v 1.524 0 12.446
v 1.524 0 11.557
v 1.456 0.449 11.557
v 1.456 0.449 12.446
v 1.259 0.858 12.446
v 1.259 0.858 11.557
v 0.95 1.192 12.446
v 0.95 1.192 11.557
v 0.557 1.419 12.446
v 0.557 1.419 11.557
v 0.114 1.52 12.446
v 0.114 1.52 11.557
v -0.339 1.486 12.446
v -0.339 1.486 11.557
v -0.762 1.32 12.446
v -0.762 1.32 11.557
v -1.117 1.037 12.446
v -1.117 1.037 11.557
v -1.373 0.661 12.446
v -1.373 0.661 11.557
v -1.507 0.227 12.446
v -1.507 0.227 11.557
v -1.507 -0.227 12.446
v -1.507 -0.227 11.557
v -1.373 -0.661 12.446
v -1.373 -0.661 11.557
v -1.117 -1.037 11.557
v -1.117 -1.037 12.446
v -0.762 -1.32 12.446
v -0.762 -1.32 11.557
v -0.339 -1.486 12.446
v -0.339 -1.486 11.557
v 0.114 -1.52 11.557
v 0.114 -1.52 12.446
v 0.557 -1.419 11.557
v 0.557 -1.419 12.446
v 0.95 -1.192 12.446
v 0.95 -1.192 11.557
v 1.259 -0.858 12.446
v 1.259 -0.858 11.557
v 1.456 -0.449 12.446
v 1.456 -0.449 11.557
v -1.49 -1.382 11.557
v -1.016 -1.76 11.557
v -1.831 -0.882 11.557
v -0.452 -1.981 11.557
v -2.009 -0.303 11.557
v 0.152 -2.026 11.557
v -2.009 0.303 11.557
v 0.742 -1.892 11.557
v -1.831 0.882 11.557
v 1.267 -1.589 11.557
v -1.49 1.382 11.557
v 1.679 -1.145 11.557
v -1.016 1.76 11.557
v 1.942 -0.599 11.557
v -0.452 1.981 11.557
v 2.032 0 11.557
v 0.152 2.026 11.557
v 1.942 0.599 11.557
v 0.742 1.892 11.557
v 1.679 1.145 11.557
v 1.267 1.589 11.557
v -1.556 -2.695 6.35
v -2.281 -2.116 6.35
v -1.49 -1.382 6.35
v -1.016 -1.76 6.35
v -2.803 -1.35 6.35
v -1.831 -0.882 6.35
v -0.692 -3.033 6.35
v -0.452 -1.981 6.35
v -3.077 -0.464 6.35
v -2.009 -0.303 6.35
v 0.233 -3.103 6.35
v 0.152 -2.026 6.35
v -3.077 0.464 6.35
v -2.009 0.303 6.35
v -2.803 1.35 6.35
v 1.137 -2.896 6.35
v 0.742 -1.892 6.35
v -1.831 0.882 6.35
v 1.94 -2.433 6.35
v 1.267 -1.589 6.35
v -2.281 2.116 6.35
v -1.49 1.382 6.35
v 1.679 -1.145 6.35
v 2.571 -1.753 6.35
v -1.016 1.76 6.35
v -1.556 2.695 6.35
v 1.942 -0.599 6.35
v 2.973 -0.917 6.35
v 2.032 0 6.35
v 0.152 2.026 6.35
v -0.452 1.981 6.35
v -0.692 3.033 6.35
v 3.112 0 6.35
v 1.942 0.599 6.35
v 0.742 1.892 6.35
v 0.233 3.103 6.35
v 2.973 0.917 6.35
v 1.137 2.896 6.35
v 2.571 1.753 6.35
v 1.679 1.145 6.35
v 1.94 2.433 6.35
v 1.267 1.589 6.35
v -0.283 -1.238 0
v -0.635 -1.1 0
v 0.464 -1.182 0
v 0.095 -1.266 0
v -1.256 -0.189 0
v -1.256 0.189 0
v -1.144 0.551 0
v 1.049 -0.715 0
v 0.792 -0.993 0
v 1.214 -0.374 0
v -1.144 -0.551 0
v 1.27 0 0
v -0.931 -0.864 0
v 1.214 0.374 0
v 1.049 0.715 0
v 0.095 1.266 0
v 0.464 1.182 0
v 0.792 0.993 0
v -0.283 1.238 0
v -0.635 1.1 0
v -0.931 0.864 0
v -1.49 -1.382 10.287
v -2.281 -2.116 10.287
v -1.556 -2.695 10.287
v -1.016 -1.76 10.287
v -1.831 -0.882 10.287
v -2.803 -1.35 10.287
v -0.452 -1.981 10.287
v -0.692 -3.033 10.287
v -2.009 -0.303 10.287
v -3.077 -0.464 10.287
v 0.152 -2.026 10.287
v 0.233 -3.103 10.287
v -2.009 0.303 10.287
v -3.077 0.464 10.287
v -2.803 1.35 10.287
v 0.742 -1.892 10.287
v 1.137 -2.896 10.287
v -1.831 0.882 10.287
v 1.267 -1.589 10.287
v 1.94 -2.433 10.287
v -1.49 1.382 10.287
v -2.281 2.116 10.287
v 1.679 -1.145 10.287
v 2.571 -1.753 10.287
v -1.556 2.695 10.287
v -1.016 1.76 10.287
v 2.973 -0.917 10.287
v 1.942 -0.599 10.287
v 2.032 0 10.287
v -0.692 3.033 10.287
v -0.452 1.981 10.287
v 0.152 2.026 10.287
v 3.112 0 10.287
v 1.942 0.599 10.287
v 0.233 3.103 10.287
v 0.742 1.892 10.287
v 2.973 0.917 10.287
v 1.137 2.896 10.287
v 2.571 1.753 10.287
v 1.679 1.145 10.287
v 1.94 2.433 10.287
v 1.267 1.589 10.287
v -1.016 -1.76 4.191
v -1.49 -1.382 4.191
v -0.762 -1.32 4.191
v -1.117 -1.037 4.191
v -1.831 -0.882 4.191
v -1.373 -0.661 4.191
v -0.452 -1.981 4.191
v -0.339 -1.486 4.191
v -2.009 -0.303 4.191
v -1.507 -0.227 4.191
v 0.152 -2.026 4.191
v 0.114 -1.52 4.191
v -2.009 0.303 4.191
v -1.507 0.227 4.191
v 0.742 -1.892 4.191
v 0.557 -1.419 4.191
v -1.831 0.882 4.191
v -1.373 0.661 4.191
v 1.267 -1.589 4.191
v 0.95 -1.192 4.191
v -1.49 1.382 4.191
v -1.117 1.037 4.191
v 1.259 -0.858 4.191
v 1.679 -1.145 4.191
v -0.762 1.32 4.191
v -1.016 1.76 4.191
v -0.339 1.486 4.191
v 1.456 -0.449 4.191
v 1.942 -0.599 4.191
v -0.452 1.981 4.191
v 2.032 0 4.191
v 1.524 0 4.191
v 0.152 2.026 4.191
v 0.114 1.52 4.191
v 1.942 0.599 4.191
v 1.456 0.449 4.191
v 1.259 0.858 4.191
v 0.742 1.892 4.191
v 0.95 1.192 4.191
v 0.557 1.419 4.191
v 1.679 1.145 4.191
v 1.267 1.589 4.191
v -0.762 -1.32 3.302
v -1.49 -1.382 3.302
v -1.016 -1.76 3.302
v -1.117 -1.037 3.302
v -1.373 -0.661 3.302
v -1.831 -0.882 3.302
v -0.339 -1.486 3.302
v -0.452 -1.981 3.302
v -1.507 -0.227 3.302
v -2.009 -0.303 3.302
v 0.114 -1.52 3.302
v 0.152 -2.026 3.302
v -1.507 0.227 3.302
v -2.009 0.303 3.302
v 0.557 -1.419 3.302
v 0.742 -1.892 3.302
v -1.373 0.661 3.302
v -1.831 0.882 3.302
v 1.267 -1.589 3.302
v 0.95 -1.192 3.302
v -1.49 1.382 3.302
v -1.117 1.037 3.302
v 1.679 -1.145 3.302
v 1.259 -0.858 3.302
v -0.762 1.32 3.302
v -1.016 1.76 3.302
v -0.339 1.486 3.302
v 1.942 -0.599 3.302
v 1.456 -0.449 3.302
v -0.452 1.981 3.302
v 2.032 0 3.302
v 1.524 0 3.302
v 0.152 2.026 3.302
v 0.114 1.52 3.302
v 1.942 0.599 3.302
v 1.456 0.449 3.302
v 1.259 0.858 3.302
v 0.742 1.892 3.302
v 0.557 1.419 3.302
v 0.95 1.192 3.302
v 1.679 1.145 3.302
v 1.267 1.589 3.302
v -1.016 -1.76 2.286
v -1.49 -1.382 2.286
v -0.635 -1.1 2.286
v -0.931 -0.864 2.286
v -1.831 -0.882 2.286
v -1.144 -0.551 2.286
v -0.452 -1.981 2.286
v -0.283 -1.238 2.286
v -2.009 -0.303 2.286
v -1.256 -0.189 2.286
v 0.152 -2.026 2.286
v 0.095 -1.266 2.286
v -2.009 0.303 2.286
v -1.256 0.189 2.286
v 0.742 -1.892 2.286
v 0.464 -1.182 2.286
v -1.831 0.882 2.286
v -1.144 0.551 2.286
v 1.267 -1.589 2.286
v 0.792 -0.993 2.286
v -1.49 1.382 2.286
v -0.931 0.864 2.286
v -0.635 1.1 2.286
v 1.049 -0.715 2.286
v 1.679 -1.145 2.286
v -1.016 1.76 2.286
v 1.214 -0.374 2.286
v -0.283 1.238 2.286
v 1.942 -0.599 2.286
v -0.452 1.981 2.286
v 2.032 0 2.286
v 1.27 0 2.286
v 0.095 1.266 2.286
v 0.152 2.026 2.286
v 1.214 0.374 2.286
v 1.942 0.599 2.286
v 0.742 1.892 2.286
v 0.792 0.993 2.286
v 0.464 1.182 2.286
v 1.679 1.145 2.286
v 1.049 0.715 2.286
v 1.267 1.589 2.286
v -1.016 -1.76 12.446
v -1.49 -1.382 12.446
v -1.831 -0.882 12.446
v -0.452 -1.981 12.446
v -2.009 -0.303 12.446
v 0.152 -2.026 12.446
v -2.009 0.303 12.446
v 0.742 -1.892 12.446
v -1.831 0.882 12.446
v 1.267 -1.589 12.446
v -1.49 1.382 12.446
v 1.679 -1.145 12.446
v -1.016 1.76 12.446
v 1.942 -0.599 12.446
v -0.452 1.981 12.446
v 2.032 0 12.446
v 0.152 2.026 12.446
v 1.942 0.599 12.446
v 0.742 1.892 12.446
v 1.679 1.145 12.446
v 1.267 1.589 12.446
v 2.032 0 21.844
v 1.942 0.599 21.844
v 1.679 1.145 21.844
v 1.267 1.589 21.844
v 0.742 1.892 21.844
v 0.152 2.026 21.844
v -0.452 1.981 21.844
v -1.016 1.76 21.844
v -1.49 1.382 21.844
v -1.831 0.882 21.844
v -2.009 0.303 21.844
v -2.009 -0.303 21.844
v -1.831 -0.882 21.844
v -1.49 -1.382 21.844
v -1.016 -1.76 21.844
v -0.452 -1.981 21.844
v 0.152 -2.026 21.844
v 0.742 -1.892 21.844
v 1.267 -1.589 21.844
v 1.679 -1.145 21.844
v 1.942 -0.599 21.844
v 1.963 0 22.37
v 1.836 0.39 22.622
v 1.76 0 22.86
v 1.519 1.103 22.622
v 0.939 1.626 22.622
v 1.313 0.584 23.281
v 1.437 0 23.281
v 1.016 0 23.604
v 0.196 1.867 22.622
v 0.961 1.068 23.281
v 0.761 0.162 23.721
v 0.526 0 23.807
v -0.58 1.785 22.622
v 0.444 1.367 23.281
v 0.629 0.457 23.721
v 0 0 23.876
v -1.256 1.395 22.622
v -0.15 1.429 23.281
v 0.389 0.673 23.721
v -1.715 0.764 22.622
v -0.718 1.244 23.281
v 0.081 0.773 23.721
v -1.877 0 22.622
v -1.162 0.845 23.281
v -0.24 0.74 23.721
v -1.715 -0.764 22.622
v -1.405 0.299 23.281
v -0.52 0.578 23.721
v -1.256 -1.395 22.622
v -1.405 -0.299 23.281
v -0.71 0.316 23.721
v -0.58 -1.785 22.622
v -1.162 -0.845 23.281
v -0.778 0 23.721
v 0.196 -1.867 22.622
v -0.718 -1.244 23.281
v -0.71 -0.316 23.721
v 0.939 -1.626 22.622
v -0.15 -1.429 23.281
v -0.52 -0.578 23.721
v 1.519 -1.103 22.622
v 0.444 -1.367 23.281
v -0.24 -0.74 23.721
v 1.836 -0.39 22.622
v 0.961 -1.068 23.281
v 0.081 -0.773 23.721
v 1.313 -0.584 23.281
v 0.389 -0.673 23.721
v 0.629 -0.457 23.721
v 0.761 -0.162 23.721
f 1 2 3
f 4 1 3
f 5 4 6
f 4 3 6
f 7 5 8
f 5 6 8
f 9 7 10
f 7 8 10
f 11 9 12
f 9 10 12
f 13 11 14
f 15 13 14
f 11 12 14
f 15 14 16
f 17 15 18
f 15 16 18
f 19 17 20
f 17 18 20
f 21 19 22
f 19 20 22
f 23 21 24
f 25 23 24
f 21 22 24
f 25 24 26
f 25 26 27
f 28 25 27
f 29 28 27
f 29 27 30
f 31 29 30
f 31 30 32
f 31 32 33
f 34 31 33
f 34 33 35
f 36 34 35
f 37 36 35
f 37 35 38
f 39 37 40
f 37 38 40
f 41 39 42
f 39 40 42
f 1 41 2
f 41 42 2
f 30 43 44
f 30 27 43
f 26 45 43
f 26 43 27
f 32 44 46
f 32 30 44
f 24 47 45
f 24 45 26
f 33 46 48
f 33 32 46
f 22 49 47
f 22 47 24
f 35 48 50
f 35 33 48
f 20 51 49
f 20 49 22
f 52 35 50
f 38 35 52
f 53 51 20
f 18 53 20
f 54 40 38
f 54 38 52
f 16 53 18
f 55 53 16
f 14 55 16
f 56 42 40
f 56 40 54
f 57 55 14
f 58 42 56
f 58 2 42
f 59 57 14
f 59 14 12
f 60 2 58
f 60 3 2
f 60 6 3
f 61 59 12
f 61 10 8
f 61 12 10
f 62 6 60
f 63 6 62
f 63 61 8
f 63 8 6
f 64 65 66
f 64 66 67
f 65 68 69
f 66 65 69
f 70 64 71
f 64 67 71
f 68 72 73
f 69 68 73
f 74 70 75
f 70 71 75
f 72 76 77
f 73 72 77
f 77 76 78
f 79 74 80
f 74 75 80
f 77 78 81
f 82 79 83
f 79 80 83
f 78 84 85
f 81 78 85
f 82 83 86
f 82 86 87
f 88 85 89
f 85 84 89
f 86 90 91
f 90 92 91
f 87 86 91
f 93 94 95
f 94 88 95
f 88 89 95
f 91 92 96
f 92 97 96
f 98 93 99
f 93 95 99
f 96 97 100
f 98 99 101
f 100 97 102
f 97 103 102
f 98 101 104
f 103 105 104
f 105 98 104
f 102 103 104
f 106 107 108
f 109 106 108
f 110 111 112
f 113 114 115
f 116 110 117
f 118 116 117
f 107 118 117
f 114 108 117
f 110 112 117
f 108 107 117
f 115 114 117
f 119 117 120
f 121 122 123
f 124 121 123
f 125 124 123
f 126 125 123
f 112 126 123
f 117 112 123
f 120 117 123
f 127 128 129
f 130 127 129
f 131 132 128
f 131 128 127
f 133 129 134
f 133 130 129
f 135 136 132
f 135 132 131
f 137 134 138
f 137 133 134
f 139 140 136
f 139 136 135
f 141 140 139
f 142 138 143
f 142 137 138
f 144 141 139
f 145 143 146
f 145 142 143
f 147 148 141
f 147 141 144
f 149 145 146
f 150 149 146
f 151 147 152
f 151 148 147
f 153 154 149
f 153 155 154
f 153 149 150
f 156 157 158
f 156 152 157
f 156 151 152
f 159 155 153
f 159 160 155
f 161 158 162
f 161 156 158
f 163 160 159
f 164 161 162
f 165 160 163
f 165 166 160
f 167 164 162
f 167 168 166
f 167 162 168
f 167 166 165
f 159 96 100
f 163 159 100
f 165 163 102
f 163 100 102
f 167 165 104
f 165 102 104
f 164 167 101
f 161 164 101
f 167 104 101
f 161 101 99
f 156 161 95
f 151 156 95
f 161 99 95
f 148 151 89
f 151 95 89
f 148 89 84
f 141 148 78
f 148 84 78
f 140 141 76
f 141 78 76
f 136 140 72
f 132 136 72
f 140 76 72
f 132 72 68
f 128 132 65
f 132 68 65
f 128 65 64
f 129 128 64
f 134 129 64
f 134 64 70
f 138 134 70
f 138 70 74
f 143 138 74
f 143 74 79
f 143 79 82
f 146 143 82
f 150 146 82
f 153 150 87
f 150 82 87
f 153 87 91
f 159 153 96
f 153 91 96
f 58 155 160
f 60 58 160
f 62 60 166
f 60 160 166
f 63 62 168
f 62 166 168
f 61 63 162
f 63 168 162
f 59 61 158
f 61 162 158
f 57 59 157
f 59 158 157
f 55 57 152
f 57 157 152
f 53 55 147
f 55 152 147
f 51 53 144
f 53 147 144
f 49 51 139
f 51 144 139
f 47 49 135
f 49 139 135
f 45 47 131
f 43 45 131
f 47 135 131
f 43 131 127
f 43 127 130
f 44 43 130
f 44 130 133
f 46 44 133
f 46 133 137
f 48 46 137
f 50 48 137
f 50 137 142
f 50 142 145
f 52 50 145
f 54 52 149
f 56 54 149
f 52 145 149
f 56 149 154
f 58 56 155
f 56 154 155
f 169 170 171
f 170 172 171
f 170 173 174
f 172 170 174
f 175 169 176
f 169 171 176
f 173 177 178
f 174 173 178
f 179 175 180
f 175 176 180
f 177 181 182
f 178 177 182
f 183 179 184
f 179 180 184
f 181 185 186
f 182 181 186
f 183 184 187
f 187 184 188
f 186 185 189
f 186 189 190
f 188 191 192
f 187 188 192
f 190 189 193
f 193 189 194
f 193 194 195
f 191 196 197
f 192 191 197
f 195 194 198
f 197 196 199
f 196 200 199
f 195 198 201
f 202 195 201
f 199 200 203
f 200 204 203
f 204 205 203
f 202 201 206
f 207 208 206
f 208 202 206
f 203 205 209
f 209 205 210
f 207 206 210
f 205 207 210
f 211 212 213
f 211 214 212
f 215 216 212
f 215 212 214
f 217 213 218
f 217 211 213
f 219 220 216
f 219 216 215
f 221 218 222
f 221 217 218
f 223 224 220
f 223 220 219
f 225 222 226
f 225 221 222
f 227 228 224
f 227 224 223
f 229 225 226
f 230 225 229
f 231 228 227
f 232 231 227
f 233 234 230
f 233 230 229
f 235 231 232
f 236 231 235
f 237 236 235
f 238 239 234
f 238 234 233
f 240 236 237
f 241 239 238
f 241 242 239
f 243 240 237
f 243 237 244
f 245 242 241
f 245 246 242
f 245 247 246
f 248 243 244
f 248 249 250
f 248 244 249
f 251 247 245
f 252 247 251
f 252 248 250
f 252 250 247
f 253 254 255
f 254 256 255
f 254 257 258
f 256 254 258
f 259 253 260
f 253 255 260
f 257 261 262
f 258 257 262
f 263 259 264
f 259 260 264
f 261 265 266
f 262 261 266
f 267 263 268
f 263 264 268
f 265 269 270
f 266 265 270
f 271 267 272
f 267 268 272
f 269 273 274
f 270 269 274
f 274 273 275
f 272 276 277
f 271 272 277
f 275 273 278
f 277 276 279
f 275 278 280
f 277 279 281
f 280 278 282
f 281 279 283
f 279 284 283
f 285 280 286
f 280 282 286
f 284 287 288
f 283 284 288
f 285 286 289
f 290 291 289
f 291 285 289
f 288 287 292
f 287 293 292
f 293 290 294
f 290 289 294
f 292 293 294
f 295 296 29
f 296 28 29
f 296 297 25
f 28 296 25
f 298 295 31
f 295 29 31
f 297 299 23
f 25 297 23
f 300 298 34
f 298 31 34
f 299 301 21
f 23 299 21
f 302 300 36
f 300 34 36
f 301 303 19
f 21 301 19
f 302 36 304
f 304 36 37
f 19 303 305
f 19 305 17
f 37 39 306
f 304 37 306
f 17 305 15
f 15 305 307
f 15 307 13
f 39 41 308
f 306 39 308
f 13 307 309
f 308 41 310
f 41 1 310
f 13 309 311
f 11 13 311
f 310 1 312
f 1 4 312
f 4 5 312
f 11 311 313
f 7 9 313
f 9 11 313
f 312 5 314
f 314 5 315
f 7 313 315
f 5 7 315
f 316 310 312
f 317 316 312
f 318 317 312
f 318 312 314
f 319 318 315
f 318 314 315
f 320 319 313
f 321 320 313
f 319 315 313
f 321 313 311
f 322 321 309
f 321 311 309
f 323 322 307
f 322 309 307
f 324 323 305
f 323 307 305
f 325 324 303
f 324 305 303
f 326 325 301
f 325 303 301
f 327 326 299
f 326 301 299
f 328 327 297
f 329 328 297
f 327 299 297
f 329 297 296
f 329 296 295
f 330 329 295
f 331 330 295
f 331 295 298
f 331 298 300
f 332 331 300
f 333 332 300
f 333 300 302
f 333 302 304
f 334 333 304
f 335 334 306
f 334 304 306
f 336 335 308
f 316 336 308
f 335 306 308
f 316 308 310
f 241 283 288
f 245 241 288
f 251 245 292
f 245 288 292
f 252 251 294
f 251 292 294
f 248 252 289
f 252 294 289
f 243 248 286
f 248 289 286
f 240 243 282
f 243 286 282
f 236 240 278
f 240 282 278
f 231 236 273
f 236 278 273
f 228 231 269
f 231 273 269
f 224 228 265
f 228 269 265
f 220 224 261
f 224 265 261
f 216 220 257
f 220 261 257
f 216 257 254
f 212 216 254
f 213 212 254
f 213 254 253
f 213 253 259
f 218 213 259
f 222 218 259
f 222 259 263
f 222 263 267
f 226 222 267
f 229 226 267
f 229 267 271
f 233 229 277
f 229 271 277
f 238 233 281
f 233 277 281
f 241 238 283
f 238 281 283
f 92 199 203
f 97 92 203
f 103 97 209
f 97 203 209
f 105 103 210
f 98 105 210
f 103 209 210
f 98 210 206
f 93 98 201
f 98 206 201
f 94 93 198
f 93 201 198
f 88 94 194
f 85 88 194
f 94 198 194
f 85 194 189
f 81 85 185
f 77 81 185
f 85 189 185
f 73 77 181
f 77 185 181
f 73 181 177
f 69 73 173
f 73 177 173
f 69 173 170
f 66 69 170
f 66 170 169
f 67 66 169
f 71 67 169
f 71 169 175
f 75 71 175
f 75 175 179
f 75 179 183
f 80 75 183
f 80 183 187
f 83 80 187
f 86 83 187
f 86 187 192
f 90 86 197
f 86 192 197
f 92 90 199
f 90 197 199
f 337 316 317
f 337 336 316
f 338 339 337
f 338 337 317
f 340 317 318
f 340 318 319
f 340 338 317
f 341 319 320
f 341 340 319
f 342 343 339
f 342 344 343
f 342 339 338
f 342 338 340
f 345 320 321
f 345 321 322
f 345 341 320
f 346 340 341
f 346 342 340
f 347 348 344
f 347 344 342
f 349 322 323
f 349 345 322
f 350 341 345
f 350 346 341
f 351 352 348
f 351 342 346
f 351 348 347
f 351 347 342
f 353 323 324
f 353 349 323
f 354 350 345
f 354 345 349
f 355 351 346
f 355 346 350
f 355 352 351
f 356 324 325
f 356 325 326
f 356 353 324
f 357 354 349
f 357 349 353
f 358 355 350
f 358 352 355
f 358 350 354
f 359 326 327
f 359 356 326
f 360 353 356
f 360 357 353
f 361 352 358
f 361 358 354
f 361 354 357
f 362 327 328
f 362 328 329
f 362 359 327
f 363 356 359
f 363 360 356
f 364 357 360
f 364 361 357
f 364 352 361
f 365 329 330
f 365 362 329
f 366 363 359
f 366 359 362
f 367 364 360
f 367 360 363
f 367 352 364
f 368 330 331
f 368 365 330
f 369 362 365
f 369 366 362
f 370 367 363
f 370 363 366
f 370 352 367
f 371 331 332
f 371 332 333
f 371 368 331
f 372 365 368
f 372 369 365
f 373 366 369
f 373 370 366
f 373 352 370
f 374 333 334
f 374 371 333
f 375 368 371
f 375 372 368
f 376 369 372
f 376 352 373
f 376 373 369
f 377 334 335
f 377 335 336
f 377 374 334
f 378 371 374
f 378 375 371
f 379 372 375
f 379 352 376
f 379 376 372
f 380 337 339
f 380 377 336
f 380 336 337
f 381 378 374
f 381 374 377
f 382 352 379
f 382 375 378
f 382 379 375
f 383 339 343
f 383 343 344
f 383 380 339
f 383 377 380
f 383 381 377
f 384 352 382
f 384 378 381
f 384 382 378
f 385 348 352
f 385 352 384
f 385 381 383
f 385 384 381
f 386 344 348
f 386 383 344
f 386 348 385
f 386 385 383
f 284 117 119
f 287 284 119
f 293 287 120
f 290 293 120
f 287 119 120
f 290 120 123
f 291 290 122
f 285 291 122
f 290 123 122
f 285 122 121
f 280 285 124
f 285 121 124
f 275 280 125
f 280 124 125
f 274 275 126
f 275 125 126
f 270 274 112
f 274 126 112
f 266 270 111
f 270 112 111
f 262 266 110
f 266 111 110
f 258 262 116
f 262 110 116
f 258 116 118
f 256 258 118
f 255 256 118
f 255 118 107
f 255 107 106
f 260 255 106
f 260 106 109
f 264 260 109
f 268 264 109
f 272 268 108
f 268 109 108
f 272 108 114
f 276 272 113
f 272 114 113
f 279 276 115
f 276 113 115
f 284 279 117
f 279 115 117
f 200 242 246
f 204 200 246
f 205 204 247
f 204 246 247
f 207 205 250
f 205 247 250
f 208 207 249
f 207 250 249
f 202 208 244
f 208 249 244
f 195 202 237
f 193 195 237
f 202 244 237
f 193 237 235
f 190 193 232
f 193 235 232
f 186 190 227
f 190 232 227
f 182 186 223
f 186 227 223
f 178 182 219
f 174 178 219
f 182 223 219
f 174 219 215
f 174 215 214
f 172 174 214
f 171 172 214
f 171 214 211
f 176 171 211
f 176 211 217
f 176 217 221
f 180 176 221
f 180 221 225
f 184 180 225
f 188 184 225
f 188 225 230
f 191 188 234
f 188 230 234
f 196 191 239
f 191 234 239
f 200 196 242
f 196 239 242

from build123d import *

# Parameters (mm, degrees)
SKETCH1_R           = 1.27
BOSS_EXTRUDE1_DEPTH = 2.286
SKETCH2_R           = 2.032
BOSS_EXTRUDE2_DEPTH = 1.016
SKETCH3_R           = 1.524
BOSS_EXTRUDE3_DEPTH = 0.889
SKETCH4_R           = 2.032
BOSS_EXTRUDE4_DEPTH = 2.159
SKETCH6_R           = 3.1115
BOSS_EXTRUDE5_DEPTH = 3.937
SKETCH7_R           = 2.032
BOSS_EXTRUDE6_DEPTH = 1.27
SKETCH8_R           = 1.524
BOSS_EXTRUDE7_DEPTH = 0.889
SKETCH9_R           = 2.032
BOSS_EXTRUDE8_DEPTH = 11.43
FILLET1_R           = 2.032


with BuildPart() as part:
    # Sketch1 → Boss-Extrude1 (new body)
    with BuildSketch(Plane.XY):
        Circle(SKETCH1_R)
    extrude(amount=BOSS_EXTRUDE1_DEPTH)

    # Sketch2 → Boss-Extrude2 (add)
    with BuildSketch(Plane.XY.offset(2.286)):
        Circle(SKETCH2_R)
    extrude(amount=BOSS_EXTRUDE2_DEPTH)

    # Sketch3 → Boss-Extrude3 (add)
    with BuildSketch(Plane.XY.offset(3.302)):
        Circle(SKETCH3_R)
    extrude(amount=BOSS_EXTRUDE3_DEPTH)

    # Sketch4 → Boss-Extrude4 (add)
    with BuildSketch(Plane.XY.offset(4.191)):
        Circle(SKETCH4_R)
    extrude(amount=BOSS_EXTRUDE4_DEPTH)

    # Sketch6 → Boss-Extrude5 (add)
    with BuildSketch(Plane.XY.offset(6.35)):
        Circle(SKETCH6_R)
    extrude(amount=BOSS_EXTRUDE5_DEPTH)

    # Sketch7 → Boss-Extrude6 (add)
    with BuildSketch(Plane.XY.offset(10.287)):
        Circle(SKETCH7_R)
    extrude(amount=BOSS_EXTRUDE6_DEPTH)

    # Sketch8 → Boss-Extrude7 (add)
    with BuildSketch(Plane.XY.offset(11.557)):
        Circle(SKETCH8_R)
    extrude(amount=BOSS_EXTRUDE7_DEPTH)

    # Sketch9 → Boss-Extrude8 (add)
    with BuildSketch(Plane.XY.offset(12.446)):
        Circle(SKETCH9_R)
    extrude(amount=BOSS_EXTRUDE8_DEPTH)

    # Fillet1
    fillet1_edges = [part.edges().sort_by_distance(p)[0] for p in [
        (-2.032, 0, 23.876),
    ]]
    fillet(fillet1_edges, radius=FILLET1_R)


solid = part.part
